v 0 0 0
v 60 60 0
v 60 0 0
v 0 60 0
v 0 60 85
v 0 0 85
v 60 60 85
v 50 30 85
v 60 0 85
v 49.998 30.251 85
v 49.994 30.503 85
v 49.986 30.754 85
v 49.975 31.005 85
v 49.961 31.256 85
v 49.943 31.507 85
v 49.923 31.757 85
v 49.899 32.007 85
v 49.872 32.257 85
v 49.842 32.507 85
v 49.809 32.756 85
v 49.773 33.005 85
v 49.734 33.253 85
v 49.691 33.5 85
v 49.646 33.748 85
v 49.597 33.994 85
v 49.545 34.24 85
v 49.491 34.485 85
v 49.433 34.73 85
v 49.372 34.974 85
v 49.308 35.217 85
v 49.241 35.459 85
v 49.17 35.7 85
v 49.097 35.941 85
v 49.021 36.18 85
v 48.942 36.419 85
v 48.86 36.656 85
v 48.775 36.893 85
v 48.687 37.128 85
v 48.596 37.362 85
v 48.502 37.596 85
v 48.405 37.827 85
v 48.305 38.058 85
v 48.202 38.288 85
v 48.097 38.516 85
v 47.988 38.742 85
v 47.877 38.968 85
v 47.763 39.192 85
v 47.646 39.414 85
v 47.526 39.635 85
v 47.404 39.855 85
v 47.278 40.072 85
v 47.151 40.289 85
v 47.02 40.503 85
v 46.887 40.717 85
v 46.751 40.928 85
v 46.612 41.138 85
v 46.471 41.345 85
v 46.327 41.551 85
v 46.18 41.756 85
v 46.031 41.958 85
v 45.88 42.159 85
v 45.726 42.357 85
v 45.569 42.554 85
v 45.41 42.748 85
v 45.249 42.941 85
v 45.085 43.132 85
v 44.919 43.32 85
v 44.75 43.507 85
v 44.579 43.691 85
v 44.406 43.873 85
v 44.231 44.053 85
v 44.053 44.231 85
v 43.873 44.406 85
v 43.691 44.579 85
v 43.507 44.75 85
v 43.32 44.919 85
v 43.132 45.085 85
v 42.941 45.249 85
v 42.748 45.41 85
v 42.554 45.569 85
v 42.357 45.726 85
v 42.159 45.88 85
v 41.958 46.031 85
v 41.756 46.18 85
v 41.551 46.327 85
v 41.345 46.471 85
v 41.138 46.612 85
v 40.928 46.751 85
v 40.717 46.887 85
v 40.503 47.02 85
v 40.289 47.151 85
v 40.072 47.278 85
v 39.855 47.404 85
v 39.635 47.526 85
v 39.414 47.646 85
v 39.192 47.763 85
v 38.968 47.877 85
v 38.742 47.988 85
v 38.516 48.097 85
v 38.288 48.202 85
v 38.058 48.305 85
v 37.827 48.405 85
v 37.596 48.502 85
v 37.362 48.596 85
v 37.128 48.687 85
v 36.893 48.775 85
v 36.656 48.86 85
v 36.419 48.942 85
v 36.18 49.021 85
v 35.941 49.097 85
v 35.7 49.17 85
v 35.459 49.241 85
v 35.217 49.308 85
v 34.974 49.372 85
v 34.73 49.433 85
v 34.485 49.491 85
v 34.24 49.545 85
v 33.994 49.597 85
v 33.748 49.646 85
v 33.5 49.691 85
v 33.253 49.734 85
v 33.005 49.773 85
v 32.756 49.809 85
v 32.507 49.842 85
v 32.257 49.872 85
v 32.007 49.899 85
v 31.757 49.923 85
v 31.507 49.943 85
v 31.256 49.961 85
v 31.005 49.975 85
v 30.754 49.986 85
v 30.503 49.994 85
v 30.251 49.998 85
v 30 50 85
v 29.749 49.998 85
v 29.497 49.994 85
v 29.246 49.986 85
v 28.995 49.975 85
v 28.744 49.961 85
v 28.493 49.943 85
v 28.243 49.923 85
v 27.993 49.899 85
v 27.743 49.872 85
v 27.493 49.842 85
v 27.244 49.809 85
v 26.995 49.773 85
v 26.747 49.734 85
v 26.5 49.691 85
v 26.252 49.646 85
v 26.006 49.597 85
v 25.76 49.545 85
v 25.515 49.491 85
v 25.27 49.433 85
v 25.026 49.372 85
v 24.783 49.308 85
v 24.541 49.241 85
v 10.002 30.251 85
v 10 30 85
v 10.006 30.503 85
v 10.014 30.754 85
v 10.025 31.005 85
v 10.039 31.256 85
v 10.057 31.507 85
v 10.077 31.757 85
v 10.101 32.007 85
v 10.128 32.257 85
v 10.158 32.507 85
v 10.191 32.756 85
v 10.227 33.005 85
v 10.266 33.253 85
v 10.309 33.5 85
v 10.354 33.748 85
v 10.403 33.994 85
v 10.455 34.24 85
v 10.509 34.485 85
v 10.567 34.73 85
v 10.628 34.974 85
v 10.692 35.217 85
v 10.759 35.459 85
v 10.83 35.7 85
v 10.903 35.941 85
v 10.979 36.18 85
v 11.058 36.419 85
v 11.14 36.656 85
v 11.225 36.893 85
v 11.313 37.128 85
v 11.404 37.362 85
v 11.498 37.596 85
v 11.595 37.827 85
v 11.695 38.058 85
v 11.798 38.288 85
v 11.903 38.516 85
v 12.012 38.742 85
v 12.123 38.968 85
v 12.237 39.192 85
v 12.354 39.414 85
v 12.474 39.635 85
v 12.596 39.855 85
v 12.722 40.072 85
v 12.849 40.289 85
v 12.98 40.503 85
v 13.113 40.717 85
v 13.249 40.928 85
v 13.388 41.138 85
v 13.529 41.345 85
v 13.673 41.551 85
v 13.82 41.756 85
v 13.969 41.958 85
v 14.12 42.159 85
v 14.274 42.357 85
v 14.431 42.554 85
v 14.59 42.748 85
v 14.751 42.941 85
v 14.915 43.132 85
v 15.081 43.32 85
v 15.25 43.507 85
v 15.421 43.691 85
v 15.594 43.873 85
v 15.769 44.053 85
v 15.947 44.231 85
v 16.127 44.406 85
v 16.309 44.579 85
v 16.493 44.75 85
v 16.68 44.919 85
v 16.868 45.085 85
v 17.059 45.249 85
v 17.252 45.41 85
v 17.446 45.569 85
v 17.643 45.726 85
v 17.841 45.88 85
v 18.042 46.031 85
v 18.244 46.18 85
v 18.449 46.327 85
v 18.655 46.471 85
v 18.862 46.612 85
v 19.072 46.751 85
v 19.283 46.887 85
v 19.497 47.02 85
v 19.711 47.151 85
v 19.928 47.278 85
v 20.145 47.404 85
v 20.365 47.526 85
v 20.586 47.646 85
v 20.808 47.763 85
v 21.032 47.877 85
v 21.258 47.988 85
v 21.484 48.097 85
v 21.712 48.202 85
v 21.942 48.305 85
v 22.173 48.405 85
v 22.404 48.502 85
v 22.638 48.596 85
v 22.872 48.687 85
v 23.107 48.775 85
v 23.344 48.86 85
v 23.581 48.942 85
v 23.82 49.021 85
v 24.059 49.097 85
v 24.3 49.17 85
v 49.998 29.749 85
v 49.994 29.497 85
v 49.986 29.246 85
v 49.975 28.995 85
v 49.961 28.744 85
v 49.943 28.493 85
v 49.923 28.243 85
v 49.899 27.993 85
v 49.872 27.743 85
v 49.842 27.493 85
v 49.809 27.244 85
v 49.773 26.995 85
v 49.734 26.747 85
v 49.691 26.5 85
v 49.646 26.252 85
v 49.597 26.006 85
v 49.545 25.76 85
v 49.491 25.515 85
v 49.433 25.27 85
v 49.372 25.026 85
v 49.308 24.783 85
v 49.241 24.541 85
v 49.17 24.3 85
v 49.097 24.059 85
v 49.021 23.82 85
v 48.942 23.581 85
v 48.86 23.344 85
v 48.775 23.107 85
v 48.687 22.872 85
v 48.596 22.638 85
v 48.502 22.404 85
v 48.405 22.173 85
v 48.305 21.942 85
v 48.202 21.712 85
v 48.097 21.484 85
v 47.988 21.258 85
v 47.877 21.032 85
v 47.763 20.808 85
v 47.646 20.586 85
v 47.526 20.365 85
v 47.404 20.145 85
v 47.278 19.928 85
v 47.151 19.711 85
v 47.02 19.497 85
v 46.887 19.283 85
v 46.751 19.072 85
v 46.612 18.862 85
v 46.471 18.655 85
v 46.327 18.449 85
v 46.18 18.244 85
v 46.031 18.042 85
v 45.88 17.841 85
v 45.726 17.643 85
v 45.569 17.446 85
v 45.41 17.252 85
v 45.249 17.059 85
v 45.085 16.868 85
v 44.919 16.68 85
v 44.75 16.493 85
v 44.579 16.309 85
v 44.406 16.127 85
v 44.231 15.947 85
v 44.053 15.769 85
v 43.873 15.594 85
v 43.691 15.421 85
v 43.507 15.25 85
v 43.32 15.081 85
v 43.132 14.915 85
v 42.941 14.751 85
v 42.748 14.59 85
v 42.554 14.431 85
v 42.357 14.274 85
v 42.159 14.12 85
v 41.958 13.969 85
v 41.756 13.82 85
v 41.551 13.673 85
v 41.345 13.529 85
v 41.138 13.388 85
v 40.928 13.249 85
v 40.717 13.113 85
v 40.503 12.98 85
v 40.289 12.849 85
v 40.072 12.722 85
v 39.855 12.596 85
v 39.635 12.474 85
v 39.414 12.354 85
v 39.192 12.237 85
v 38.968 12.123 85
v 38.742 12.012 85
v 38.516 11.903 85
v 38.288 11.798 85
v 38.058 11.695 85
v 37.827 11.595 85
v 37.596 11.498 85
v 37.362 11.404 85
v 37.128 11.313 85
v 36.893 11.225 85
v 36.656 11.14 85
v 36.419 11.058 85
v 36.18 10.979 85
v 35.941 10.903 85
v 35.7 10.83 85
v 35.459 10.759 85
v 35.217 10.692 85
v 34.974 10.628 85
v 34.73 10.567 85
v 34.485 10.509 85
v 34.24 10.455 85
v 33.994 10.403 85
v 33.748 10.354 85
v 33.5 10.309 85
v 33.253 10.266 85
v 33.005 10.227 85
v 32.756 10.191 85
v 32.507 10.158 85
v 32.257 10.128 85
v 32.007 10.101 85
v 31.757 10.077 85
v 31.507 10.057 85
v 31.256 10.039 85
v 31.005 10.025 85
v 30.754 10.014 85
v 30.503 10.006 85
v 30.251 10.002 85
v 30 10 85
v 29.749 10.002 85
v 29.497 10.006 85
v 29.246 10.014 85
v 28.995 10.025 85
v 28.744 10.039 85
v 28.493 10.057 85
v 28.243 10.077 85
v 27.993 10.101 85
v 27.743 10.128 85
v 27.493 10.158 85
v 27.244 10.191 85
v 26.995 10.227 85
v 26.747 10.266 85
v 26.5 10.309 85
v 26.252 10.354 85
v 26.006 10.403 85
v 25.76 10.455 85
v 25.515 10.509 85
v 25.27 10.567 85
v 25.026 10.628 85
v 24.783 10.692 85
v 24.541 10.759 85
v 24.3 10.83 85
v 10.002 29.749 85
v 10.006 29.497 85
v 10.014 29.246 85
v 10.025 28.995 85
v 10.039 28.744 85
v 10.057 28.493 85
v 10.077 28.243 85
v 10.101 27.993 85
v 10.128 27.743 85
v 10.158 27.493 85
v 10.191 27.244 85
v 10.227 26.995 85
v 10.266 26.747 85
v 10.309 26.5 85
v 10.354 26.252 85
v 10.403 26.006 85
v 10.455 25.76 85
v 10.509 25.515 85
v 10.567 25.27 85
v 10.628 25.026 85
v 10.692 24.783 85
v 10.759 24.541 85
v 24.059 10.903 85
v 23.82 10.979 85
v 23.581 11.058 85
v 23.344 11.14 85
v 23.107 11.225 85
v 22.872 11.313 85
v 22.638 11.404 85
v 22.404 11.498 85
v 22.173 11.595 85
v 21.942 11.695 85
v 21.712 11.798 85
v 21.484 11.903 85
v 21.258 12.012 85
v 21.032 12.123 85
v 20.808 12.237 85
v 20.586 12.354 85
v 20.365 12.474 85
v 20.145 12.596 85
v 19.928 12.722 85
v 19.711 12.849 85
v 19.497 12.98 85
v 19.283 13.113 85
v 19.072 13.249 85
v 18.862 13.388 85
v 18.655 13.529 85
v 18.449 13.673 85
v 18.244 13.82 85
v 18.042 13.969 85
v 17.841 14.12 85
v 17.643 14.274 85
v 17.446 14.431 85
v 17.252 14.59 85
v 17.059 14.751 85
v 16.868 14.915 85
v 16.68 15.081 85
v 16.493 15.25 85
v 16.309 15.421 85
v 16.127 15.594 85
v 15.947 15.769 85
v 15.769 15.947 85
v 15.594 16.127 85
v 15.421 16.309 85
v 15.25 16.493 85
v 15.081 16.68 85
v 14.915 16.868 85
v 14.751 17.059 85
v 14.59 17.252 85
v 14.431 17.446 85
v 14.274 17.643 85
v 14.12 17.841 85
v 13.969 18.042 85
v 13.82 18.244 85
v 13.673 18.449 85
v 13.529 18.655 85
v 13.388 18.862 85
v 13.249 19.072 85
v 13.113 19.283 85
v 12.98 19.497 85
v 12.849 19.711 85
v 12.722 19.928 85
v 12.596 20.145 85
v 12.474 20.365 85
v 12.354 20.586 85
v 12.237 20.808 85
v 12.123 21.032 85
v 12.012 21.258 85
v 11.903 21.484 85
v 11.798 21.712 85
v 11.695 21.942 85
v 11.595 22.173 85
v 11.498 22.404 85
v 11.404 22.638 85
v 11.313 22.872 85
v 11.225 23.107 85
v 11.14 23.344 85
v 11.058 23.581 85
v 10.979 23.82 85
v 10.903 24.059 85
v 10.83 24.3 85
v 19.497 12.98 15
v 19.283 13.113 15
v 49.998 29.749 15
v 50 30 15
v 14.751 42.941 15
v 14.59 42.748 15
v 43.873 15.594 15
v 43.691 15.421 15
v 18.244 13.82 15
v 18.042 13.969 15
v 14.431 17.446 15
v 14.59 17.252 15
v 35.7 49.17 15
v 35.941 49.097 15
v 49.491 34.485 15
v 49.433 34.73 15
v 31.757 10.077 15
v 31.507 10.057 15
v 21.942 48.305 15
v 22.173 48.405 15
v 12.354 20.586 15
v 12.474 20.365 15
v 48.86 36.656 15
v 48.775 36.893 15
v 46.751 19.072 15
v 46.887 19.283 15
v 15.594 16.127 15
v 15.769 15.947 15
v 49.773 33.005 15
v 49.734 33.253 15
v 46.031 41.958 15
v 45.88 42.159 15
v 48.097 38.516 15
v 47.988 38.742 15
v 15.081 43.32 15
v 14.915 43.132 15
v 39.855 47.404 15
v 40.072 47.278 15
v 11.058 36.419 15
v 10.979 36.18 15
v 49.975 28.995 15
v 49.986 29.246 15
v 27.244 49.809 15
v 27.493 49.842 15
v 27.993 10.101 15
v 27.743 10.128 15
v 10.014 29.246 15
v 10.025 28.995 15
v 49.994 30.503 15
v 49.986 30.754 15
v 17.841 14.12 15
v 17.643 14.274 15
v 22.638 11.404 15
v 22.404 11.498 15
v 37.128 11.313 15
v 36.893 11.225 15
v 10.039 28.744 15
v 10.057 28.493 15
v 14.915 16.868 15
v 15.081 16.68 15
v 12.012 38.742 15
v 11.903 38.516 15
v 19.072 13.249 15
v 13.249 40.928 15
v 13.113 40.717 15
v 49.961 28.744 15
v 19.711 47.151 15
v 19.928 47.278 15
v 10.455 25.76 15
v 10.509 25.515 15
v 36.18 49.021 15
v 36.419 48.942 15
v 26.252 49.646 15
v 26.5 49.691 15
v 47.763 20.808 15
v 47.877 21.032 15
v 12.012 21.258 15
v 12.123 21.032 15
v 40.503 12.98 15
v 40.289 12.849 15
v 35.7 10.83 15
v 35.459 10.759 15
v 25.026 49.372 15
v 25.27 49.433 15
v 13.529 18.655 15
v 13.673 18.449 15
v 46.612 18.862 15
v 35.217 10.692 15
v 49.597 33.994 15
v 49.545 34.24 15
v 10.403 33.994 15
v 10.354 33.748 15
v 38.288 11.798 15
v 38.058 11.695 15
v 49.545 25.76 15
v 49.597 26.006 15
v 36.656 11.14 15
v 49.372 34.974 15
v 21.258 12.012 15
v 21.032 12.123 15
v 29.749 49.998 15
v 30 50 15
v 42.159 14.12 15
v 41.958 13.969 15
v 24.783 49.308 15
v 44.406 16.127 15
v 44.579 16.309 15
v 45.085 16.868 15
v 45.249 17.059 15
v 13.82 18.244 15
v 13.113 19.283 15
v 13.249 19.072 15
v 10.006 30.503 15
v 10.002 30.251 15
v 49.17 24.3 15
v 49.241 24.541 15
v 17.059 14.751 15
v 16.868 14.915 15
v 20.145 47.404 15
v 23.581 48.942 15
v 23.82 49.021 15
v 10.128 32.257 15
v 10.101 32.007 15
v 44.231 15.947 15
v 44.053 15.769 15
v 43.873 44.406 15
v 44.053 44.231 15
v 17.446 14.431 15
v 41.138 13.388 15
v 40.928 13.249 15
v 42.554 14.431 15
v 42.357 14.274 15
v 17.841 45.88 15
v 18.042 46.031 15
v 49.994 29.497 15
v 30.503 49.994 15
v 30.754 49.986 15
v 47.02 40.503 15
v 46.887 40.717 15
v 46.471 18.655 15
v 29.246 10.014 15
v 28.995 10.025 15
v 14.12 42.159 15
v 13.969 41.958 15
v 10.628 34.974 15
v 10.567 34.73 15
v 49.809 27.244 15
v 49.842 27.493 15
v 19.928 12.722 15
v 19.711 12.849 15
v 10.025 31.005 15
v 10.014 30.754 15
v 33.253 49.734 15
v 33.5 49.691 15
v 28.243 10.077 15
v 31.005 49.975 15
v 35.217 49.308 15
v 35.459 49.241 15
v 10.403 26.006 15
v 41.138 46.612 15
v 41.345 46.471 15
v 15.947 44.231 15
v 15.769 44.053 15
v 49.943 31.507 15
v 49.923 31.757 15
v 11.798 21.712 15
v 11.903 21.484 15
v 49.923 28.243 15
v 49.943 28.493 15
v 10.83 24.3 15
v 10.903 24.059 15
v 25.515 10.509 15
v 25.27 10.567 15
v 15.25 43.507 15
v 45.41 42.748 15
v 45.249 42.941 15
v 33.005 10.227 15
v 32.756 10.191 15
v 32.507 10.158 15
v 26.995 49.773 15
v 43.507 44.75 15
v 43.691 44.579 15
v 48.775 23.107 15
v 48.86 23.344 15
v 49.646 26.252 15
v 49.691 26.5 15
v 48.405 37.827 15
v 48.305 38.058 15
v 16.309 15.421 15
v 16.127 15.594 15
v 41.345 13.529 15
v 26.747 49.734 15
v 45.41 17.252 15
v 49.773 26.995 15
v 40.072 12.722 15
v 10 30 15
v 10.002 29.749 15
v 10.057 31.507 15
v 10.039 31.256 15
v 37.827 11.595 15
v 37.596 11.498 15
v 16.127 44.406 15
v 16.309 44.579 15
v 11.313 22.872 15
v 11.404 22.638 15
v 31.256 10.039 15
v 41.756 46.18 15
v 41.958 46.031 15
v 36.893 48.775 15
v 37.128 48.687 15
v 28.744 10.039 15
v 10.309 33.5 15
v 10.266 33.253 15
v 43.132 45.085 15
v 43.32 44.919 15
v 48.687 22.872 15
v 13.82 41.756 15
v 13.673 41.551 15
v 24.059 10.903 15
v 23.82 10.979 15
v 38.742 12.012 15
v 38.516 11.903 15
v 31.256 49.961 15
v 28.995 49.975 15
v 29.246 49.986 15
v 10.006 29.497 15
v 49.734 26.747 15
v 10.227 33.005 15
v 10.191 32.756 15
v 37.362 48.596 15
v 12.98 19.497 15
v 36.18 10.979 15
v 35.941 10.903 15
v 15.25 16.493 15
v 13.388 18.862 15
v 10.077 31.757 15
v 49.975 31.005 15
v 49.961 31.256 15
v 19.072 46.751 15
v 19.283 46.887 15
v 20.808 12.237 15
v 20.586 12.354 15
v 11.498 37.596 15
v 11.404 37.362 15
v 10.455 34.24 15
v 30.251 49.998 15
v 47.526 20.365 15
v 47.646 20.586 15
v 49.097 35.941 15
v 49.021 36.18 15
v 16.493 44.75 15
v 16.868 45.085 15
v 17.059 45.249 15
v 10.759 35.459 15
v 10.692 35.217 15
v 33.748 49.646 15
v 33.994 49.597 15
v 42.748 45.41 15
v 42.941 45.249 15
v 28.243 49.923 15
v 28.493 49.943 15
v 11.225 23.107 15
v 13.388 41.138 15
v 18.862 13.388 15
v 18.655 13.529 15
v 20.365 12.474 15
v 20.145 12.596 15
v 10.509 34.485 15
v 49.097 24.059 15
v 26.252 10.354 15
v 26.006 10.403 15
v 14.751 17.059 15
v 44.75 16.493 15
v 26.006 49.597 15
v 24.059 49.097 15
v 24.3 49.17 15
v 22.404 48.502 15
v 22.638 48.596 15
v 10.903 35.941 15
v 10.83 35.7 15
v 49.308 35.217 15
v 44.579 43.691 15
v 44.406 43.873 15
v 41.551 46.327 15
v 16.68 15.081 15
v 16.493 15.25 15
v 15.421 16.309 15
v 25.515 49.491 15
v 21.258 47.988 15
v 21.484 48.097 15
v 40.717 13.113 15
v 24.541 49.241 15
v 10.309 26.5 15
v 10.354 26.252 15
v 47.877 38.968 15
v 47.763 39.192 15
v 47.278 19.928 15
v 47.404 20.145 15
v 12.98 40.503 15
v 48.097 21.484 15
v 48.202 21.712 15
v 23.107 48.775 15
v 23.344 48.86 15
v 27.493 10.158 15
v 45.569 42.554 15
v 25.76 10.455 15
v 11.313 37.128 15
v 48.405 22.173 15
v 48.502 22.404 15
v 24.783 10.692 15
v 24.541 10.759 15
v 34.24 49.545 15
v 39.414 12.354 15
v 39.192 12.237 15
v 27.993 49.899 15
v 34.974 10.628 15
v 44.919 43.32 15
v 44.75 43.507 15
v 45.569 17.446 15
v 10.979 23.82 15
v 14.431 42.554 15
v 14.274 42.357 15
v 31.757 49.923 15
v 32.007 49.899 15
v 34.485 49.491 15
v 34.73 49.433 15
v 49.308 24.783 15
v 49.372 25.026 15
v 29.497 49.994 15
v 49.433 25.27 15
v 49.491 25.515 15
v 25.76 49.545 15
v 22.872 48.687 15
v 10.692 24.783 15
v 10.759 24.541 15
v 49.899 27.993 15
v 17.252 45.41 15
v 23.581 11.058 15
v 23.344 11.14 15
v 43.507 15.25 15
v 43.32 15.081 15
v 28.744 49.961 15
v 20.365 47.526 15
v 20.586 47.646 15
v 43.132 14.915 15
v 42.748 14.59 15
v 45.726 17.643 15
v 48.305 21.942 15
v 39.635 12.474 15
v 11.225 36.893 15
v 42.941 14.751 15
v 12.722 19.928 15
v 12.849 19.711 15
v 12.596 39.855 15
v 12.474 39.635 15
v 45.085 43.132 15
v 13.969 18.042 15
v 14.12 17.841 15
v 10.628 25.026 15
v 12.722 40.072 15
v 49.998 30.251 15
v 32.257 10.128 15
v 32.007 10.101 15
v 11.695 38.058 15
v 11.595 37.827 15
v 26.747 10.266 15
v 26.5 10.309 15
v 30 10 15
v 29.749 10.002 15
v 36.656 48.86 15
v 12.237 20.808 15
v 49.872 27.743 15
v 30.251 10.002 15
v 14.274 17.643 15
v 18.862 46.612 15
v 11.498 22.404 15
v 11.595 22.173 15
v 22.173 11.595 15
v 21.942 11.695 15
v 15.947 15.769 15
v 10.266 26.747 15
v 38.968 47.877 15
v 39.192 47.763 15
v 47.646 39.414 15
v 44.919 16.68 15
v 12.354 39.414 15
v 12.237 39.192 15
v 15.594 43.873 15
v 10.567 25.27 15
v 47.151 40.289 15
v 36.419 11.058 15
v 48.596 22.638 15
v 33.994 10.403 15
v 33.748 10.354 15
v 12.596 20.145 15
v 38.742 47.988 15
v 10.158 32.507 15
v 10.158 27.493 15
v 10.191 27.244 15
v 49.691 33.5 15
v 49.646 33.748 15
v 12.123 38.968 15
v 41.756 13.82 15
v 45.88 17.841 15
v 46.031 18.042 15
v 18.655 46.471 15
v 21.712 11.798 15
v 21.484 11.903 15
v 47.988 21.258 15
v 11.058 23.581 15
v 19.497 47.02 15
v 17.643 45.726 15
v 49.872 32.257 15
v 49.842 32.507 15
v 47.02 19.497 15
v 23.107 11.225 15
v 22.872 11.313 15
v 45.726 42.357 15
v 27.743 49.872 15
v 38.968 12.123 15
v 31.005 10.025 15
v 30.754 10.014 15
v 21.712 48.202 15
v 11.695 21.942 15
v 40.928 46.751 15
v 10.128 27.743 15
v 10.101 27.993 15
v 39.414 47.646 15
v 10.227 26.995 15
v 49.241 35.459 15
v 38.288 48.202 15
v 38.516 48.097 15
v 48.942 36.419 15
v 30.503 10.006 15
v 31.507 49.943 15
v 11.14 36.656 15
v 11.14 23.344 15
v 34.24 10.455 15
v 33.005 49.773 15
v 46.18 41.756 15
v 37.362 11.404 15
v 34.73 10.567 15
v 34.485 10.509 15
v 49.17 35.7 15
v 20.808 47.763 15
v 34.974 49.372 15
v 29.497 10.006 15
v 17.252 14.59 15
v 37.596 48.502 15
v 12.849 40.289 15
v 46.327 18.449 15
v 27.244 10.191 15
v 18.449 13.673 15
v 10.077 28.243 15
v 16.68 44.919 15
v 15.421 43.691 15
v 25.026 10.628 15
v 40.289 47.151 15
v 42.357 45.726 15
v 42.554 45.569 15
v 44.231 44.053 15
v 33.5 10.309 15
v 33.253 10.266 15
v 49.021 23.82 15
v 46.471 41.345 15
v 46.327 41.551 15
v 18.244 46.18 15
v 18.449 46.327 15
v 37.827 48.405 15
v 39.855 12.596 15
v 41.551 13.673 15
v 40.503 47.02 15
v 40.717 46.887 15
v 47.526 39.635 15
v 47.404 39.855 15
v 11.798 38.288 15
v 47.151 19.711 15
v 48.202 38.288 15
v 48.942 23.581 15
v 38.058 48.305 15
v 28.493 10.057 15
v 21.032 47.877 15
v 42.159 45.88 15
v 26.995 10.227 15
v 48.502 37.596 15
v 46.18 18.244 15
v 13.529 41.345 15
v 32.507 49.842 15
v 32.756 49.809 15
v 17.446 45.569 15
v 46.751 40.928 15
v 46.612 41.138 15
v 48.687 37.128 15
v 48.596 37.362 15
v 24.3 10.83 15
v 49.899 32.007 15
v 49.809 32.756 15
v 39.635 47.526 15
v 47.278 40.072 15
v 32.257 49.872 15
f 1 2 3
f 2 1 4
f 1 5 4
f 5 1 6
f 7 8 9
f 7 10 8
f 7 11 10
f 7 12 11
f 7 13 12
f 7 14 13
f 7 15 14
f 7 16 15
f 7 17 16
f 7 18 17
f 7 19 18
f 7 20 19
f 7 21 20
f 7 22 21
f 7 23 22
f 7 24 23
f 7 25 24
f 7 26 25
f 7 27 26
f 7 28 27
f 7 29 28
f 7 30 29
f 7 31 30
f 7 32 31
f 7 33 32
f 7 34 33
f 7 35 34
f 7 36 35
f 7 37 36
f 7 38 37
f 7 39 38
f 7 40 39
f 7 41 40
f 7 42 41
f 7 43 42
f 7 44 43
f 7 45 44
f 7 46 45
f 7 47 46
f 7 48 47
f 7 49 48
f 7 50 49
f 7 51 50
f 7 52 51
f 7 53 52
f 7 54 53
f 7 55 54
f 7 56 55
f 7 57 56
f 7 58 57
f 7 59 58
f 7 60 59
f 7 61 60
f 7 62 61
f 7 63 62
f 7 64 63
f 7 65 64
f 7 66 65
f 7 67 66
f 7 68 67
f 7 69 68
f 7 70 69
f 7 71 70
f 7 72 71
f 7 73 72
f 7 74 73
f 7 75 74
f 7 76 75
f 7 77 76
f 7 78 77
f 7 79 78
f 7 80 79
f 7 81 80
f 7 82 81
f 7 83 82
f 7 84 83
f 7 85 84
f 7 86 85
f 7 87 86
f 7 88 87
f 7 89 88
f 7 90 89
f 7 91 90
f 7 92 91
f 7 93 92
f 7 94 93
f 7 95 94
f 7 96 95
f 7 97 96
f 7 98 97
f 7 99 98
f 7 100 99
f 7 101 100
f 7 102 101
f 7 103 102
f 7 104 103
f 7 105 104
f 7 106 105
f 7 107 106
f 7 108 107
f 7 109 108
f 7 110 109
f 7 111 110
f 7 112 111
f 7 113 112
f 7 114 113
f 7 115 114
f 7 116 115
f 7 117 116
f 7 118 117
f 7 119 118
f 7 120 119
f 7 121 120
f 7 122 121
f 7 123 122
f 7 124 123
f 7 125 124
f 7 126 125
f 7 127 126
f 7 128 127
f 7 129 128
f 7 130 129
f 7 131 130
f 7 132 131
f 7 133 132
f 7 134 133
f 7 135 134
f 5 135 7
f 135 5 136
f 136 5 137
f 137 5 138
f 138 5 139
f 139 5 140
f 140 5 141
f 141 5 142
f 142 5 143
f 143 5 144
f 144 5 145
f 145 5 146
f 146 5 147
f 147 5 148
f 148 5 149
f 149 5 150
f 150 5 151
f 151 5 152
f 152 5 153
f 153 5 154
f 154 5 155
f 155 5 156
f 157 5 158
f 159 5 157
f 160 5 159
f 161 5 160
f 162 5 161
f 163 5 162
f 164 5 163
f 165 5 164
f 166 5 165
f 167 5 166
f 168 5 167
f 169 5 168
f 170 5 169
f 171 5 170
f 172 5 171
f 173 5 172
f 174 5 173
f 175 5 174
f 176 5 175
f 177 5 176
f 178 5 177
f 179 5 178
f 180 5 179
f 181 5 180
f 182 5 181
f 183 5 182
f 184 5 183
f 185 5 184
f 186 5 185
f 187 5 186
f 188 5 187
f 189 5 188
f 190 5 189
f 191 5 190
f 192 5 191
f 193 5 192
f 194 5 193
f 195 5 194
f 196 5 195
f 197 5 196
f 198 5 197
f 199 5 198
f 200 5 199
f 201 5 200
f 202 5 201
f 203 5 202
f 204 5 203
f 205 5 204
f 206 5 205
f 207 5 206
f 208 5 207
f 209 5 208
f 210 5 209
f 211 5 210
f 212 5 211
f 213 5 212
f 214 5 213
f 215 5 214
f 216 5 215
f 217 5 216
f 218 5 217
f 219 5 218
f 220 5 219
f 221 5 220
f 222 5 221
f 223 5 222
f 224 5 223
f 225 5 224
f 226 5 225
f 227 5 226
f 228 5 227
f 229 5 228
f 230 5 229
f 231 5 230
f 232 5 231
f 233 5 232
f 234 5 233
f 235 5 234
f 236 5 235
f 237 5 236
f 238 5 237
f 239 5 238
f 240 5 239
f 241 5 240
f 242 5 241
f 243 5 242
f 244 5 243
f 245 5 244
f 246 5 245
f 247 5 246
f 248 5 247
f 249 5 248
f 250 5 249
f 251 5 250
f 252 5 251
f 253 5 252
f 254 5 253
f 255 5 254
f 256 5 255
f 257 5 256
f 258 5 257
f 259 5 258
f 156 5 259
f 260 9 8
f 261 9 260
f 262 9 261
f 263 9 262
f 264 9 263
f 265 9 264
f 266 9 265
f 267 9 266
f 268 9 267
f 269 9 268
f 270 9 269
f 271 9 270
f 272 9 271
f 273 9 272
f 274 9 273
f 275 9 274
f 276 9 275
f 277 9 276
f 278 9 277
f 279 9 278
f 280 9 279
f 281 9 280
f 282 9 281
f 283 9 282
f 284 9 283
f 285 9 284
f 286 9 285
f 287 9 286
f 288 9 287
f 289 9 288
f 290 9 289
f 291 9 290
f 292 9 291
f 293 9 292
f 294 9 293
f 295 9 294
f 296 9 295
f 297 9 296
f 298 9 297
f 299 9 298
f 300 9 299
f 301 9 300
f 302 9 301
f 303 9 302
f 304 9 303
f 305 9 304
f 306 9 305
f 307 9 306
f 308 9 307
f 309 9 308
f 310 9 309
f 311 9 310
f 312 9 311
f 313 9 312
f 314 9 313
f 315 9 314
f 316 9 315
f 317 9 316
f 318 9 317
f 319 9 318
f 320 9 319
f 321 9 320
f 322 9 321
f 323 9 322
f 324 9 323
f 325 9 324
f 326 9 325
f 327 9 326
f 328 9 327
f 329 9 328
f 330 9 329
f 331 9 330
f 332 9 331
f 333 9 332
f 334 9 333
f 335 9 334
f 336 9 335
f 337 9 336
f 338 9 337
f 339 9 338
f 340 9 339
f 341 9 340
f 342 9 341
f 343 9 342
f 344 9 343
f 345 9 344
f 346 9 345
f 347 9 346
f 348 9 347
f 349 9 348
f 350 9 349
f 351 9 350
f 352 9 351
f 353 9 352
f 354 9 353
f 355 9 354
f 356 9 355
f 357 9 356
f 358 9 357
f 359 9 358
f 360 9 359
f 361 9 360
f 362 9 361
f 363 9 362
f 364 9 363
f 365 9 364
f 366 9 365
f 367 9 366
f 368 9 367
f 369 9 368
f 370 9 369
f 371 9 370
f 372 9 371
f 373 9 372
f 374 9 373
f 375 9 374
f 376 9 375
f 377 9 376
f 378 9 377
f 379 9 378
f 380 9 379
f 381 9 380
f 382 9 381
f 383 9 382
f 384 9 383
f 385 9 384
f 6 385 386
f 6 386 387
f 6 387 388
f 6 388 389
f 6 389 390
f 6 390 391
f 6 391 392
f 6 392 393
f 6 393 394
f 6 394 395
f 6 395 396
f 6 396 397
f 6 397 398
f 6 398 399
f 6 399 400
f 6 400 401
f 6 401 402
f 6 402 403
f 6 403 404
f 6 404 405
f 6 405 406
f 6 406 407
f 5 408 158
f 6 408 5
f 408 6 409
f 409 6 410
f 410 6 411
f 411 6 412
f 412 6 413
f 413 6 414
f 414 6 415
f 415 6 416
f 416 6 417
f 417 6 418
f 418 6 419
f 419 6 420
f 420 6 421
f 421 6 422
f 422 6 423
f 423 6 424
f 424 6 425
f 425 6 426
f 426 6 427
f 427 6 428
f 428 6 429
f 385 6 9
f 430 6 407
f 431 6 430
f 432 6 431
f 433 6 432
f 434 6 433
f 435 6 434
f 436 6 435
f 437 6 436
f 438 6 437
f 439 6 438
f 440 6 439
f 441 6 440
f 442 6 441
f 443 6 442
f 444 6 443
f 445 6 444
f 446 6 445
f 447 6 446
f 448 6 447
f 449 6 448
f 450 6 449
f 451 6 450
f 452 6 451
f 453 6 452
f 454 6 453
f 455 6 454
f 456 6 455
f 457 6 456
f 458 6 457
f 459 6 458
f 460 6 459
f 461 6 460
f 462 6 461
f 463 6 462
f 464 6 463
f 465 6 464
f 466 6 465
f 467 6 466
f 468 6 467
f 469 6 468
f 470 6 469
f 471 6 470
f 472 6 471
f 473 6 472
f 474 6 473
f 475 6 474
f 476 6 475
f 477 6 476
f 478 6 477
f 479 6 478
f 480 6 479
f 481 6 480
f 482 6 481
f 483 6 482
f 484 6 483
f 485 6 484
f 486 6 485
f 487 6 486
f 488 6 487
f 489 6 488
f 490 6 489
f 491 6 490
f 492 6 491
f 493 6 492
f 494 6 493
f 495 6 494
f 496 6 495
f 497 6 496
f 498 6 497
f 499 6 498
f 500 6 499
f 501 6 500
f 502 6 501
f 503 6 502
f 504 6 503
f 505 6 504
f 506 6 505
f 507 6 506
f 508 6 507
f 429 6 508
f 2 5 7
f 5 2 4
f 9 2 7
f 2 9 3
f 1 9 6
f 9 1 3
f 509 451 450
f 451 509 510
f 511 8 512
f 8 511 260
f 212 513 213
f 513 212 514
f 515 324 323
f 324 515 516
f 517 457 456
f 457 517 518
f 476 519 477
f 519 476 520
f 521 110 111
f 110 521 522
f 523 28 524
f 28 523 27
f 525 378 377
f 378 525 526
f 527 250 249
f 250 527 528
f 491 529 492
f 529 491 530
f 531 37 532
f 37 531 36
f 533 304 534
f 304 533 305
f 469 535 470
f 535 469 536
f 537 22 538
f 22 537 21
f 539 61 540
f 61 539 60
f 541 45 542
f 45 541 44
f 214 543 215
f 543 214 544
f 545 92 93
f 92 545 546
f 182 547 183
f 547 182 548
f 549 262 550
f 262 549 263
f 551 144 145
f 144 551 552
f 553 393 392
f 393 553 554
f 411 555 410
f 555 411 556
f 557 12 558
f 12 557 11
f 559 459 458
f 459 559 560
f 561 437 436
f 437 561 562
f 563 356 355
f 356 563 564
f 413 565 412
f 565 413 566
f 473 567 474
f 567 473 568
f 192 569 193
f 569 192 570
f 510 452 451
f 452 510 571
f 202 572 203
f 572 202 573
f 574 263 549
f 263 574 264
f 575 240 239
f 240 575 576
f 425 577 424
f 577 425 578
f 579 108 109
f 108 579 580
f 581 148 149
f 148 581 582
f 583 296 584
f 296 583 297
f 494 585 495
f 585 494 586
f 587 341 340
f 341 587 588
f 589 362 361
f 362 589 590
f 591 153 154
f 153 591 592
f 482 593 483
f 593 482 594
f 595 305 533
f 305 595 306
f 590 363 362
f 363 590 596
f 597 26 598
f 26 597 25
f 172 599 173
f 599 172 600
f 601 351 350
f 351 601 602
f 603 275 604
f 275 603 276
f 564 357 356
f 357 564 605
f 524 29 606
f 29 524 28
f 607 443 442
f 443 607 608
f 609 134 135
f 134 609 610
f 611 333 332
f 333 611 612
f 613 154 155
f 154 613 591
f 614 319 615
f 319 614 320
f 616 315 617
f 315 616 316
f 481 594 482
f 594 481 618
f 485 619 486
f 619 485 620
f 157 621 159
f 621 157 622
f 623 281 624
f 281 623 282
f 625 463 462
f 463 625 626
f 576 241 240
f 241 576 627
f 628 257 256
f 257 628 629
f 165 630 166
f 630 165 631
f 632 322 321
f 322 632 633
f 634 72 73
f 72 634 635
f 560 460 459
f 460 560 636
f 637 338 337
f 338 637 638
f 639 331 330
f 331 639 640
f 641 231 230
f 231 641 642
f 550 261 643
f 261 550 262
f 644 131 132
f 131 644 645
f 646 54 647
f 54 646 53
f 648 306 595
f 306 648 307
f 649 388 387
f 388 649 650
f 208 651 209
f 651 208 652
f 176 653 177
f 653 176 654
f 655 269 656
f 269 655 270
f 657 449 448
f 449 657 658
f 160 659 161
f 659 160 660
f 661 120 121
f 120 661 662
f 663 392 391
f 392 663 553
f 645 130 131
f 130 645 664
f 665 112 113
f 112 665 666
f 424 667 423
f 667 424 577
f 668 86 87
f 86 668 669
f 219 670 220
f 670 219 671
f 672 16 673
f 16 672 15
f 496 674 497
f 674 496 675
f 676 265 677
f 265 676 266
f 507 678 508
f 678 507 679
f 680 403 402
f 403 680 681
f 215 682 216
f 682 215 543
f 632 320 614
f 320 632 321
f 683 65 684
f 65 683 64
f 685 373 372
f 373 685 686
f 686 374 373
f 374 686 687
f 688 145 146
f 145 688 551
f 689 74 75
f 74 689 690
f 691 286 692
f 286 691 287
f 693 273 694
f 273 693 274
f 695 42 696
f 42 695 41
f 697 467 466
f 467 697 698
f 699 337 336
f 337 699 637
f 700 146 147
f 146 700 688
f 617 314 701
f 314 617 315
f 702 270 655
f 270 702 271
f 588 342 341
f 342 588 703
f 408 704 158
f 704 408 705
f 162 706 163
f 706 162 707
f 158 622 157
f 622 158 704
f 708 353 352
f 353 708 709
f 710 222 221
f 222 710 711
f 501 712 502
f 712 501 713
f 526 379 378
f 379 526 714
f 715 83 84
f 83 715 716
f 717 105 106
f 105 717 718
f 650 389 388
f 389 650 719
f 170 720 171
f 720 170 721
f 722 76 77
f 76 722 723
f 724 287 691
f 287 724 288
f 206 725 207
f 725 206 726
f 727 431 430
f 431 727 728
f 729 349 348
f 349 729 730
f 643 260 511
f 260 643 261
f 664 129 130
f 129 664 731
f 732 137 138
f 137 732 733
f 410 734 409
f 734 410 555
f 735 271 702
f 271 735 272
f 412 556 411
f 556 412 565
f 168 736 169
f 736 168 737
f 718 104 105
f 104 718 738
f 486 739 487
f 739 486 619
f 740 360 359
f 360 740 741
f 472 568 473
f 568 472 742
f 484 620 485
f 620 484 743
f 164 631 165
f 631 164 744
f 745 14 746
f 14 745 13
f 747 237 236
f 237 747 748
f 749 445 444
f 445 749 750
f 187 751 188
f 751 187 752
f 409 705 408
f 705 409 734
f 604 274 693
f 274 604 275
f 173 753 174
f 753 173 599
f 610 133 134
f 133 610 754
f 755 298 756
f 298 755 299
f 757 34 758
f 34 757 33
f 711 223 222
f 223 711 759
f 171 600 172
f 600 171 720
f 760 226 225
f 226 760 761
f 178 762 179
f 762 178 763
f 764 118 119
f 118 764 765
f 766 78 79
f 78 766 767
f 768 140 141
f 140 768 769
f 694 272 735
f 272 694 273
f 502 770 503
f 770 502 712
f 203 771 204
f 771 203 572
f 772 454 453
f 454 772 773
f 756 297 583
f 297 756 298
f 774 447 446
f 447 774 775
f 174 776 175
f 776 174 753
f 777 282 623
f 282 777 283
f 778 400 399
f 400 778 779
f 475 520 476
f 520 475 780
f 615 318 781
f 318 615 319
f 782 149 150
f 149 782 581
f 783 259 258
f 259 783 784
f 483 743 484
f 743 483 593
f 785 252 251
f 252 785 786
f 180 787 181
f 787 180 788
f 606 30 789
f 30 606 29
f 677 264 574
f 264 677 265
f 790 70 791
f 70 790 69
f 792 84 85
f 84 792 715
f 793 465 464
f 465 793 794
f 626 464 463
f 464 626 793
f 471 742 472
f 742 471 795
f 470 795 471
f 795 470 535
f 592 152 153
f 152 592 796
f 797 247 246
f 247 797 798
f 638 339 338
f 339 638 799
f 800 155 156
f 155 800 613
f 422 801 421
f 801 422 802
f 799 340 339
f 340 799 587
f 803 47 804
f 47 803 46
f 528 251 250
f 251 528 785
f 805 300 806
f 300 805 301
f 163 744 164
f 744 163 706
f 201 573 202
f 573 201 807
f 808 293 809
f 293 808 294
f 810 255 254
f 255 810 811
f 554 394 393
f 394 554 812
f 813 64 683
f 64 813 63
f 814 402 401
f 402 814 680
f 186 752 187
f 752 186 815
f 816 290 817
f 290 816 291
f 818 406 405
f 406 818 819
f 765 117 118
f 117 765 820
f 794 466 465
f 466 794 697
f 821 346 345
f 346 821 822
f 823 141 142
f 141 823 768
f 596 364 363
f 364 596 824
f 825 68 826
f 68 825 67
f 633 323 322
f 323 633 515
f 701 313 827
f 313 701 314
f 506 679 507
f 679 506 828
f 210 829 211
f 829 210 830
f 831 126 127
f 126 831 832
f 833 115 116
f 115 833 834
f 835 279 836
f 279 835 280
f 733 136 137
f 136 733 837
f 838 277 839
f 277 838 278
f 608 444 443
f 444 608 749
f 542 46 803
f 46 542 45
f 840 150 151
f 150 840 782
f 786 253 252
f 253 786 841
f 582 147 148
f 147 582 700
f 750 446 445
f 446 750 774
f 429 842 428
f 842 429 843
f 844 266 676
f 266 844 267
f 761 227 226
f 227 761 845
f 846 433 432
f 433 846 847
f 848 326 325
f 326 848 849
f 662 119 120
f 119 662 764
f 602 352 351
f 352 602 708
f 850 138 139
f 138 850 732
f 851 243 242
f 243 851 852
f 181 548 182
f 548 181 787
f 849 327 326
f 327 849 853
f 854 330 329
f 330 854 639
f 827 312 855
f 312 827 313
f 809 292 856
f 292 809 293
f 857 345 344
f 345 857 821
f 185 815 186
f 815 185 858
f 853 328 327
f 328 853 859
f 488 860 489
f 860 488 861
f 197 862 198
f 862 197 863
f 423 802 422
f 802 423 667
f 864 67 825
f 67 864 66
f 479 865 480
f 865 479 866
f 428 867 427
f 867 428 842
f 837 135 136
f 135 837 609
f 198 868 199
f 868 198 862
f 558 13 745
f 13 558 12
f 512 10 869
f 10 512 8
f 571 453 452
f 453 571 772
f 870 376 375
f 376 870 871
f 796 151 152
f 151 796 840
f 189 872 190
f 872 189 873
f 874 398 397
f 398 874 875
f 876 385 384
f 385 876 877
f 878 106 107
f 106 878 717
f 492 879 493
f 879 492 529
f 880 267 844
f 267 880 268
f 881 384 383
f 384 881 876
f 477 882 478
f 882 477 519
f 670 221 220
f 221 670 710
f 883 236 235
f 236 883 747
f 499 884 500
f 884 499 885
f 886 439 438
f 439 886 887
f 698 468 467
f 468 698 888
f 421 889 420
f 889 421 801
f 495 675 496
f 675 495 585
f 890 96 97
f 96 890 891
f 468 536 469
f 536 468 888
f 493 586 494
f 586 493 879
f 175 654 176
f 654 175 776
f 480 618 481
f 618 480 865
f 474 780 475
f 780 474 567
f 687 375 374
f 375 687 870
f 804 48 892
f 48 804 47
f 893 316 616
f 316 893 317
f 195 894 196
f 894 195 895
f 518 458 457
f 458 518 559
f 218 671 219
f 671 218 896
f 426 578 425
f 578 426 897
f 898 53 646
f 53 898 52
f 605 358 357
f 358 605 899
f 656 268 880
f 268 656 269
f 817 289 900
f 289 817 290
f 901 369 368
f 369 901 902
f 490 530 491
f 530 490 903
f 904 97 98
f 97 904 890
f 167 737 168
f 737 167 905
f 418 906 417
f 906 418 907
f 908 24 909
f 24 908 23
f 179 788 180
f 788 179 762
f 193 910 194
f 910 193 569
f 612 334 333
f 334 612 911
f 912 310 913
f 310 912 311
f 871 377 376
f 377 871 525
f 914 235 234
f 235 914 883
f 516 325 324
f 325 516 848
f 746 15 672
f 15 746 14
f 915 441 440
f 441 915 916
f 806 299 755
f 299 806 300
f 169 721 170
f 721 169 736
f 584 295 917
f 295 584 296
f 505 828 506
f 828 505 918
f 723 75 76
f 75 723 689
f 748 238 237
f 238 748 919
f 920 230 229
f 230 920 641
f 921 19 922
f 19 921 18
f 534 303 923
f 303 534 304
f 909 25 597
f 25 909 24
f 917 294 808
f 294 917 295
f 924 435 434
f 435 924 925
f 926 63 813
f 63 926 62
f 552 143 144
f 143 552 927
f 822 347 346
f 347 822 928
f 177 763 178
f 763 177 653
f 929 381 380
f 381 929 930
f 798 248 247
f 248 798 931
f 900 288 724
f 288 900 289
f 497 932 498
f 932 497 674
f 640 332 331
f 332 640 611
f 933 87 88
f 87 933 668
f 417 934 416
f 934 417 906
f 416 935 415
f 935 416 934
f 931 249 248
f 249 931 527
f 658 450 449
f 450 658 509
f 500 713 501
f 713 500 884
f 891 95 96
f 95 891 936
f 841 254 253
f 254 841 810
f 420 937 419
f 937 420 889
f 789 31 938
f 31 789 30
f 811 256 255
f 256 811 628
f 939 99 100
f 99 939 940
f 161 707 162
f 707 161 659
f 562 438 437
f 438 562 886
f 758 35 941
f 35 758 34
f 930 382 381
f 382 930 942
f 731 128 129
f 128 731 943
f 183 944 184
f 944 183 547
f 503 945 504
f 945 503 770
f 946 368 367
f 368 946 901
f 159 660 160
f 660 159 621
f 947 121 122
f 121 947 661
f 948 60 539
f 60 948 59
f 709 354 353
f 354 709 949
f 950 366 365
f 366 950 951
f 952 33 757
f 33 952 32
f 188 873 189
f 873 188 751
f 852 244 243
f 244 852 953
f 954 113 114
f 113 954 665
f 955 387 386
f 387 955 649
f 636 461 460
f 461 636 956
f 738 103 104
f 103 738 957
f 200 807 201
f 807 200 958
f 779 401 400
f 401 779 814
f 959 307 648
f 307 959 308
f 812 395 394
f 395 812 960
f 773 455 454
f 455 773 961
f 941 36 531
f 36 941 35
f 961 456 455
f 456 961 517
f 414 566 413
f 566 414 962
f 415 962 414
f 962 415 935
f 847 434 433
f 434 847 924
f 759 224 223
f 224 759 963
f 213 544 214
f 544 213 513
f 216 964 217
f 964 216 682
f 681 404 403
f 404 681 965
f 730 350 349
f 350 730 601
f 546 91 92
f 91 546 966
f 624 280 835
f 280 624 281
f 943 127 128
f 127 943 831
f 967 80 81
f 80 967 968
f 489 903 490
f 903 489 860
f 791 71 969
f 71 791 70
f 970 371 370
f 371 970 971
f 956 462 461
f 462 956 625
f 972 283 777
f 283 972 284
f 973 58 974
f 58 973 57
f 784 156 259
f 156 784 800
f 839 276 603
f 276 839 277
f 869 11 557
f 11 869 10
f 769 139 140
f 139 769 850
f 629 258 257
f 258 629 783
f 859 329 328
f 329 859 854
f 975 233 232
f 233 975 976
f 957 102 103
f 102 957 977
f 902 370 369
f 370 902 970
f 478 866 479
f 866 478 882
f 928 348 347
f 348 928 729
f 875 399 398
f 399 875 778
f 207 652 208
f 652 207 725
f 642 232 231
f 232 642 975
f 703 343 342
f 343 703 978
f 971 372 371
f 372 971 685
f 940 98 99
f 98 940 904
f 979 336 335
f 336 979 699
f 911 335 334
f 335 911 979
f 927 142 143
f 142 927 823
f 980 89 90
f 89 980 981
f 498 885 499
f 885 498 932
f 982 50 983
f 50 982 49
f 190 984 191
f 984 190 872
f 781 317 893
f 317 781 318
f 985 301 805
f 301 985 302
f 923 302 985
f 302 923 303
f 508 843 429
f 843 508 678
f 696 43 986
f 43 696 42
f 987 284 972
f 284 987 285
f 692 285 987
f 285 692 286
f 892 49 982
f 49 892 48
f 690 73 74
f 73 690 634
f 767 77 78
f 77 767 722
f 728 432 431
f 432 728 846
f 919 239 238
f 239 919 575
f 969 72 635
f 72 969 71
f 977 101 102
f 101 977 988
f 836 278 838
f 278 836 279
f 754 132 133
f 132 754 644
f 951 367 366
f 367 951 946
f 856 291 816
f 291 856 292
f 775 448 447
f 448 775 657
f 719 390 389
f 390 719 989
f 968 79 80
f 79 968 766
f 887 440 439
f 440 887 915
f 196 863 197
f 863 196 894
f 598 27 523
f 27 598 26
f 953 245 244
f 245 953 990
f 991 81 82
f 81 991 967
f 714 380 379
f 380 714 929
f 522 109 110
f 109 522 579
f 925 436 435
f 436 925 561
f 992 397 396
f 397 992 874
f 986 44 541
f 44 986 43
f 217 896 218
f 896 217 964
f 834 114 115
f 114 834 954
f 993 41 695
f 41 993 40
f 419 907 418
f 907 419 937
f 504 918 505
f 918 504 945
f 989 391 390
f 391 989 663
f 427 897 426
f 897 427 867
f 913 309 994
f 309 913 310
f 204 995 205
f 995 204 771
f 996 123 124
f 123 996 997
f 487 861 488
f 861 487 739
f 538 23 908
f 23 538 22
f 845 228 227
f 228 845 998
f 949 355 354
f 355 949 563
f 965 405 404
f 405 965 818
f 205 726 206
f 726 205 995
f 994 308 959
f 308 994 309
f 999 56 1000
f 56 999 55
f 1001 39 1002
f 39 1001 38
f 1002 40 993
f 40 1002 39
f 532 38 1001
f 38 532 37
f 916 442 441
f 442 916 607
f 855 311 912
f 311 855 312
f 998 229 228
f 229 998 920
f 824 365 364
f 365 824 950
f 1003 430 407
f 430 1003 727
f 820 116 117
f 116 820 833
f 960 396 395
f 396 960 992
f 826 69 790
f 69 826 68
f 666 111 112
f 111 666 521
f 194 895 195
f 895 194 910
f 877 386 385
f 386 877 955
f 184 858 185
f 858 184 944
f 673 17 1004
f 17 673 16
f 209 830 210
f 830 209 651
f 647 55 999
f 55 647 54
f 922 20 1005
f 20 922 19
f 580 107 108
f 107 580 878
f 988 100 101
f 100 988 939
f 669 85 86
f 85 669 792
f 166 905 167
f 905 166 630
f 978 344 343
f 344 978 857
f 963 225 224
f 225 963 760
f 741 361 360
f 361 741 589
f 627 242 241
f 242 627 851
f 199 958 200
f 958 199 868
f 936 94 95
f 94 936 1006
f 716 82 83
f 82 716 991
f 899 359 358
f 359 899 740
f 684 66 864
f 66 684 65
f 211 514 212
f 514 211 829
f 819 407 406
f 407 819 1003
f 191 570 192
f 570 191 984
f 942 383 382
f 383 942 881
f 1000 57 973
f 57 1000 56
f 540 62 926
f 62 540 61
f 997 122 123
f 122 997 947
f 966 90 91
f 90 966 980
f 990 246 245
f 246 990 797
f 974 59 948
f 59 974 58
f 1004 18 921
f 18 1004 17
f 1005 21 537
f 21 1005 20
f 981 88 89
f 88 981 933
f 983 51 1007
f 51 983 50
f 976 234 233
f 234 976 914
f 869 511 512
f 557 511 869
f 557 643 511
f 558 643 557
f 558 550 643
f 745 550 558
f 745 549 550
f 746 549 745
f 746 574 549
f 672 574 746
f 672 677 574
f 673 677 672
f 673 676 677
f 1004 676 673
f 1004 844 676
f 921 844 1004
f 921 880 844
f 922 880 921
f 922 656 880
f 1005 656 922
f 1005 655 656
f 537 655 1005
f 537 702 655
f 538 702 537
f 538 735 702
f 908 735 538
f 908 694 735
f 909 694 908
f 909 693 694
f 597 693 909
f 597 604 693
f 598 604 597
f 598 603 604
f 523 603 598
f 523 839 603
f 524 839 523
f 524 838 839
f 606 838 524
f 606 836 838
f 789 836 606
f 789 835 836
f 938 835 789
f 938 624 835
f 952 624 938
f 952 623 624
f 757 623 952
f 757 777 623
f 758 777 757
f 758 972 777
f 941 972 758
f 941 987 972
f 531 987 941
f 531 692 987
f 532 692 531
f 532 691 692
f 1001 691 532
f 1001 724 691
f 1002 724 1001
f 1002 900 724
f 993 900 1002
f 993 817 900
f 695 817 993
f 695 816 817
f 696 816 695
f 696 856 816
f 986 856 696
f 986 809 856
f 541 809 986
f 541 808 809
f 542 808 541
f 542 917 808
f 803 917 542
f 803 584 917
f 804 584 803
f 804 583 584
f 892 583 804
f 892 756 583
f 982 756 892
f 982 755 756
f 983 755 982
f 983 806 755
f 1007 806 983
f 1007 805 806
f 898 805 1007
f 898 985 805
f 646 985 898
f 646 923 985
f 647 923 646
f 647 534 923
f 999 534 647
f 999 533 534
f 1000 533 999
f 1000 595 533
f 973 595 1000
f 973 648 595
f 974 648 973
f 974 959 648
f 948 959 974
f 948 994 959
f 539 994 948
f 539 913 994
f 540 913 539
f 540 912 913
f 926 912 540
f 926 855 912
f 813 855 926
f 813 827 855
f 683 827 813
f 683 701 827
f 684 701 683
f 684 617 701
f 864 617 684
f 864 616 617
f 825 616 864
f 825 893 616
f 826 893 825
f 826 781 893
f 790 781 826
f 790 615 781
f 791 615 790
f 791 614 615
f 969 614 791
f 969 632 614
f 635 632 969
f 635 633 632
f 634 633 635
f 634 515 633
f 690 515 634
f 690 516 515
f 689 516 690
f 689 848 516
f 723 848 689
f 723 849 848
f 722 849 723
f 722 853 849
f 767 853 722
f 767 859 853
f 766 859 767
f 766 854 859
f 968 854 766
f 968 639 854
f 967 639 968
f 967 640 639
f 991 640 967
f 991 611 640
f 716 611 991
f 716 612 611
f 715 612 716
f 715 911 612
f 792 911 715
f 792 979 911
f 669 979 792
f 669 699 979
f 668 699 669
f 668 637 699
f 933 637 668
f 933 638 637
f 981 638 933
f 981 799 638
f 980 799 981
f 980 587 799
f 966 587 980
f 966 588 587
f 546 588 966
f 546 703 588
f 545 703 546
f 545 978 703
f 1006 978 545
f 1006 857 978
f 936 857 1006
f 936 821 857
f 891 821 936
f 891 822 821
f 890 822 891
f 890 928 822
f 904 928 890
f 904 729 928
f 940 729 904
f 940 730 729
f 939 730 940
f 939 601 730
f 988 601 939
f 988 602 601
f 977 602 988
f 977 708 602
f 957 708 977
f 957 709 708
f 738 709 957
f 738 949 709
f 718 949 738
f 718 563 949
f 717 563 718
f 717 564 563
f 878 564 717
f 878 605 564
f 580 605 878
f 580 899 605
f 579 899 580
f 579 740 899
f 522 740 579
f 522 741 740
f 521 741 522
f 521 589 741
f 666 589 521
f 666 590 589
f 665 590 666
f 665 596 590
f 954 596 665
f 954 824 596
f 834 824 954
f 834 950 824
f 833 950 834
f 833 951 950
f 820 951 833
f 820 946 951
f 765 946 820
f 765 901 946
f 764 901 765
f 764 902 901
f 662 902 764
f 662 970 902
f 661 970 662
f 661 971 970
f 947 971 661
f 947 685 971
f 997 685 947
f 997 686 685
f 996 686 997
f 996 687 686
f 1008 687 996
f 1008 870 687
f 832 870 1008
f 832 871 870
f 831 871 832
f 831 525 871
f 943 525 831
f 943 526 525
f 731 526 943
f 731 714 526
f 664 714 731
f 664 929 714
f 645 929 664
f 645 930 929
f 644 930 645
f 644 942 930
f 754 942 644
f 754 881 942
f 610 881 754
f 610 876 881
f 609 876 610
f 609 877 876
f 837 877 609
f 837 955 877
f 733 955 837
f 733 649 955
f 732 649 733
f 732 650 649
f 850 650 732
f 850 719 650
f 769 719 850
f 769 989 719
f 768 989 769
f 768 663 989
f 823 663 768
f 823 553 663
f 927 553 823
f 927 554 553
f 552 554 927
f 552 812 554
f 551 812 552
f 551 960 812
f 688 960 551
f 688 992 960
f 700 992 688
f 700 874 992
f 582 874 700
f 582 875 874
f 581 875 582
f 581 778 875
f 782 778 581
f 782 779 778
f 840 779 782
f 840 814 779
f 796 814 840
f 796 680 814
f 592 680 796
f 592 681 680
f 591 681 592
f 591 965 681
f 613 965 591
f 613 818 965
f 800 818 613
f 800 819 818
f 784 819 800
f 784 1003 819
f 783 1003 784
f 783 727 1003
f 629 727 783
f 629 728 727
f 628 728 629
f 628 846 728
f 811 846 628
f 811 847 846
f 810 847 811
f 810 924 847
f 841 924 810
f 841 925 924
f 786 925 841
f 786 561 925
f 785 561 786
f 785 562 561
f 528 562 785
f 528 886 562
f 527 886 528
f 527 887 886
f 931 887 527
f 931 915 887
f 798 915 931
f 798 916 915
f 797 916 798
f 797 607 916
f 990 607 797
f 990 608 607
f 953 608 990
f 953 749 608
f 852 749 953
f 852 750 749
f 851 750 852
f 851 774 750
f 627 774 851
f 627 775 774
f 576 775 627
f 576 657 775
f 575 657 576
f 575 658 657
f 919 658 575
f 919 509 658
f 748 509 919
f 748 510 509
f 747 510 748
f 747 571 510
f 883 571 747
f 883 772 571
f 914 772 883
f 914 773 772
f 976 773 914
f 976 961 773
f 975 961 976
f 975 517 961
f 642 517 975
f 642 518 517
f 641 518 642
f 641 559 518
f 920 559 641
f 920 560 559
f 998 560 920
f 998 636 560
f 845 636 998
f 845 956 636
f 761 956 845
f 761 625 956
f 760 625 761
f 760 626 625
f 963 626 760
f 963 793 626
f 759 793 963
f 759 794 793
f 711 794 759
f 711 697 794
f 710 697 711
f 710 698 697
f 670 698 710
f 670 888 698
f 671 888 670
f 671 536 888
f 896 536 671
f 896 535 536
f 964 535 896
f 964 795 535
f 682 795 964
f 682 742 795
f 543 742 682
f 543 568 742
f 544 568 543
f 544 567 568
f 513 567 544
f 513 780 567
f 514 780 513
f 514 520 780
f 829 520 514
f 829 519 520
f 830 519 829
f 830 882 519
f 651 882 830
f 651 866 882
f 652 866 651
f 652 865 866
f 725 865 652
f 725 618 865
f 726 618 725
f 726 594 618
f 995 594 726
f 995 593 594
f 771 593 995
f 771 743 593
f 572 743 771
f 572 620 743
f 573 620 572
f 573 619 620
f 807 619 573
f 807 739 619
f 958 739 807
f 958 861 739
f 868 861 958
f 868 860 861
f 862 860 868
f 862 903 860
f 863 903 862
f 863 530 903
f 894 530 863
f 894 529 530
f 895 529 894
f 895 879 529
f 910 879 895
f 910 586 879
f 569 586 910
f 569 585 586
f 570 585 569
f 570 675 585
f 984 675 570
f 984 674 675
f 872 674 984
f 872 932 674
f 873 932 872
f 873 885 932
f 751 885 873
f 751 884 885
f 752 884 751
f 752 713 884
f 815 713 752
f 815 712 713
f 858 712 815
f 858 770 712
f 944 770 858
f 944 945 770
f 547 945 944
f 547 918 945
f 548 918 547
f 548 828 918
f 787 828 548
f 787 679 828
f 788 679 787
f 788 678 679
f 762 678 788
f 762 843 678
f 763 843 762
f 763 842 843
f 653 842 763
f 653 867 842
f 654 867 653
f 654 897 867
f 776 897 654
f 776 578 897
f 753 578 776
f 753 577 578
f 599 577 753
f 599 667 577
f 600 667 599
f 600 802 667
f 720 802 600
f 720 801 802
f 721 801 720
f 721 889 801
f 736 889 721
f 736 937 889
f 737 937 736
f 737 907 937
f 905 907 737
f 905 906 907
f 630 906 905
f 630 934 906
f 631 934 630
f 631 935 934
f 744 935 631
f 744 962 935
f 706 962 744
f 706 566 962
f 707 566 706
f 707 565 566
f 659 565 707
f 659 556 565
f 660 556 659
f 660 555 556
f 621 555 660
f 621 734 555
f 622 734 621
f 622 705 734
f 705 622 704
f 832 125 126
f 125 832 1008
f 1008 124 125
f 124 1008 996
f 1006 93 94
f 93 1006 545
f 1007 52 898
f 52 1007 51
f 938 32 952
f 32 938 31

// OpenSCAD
$fn=500;
difference(){
linear_extrude(85) square(60);
translate([30,30,15]) linear_extrude(70) circle(40/2);}
